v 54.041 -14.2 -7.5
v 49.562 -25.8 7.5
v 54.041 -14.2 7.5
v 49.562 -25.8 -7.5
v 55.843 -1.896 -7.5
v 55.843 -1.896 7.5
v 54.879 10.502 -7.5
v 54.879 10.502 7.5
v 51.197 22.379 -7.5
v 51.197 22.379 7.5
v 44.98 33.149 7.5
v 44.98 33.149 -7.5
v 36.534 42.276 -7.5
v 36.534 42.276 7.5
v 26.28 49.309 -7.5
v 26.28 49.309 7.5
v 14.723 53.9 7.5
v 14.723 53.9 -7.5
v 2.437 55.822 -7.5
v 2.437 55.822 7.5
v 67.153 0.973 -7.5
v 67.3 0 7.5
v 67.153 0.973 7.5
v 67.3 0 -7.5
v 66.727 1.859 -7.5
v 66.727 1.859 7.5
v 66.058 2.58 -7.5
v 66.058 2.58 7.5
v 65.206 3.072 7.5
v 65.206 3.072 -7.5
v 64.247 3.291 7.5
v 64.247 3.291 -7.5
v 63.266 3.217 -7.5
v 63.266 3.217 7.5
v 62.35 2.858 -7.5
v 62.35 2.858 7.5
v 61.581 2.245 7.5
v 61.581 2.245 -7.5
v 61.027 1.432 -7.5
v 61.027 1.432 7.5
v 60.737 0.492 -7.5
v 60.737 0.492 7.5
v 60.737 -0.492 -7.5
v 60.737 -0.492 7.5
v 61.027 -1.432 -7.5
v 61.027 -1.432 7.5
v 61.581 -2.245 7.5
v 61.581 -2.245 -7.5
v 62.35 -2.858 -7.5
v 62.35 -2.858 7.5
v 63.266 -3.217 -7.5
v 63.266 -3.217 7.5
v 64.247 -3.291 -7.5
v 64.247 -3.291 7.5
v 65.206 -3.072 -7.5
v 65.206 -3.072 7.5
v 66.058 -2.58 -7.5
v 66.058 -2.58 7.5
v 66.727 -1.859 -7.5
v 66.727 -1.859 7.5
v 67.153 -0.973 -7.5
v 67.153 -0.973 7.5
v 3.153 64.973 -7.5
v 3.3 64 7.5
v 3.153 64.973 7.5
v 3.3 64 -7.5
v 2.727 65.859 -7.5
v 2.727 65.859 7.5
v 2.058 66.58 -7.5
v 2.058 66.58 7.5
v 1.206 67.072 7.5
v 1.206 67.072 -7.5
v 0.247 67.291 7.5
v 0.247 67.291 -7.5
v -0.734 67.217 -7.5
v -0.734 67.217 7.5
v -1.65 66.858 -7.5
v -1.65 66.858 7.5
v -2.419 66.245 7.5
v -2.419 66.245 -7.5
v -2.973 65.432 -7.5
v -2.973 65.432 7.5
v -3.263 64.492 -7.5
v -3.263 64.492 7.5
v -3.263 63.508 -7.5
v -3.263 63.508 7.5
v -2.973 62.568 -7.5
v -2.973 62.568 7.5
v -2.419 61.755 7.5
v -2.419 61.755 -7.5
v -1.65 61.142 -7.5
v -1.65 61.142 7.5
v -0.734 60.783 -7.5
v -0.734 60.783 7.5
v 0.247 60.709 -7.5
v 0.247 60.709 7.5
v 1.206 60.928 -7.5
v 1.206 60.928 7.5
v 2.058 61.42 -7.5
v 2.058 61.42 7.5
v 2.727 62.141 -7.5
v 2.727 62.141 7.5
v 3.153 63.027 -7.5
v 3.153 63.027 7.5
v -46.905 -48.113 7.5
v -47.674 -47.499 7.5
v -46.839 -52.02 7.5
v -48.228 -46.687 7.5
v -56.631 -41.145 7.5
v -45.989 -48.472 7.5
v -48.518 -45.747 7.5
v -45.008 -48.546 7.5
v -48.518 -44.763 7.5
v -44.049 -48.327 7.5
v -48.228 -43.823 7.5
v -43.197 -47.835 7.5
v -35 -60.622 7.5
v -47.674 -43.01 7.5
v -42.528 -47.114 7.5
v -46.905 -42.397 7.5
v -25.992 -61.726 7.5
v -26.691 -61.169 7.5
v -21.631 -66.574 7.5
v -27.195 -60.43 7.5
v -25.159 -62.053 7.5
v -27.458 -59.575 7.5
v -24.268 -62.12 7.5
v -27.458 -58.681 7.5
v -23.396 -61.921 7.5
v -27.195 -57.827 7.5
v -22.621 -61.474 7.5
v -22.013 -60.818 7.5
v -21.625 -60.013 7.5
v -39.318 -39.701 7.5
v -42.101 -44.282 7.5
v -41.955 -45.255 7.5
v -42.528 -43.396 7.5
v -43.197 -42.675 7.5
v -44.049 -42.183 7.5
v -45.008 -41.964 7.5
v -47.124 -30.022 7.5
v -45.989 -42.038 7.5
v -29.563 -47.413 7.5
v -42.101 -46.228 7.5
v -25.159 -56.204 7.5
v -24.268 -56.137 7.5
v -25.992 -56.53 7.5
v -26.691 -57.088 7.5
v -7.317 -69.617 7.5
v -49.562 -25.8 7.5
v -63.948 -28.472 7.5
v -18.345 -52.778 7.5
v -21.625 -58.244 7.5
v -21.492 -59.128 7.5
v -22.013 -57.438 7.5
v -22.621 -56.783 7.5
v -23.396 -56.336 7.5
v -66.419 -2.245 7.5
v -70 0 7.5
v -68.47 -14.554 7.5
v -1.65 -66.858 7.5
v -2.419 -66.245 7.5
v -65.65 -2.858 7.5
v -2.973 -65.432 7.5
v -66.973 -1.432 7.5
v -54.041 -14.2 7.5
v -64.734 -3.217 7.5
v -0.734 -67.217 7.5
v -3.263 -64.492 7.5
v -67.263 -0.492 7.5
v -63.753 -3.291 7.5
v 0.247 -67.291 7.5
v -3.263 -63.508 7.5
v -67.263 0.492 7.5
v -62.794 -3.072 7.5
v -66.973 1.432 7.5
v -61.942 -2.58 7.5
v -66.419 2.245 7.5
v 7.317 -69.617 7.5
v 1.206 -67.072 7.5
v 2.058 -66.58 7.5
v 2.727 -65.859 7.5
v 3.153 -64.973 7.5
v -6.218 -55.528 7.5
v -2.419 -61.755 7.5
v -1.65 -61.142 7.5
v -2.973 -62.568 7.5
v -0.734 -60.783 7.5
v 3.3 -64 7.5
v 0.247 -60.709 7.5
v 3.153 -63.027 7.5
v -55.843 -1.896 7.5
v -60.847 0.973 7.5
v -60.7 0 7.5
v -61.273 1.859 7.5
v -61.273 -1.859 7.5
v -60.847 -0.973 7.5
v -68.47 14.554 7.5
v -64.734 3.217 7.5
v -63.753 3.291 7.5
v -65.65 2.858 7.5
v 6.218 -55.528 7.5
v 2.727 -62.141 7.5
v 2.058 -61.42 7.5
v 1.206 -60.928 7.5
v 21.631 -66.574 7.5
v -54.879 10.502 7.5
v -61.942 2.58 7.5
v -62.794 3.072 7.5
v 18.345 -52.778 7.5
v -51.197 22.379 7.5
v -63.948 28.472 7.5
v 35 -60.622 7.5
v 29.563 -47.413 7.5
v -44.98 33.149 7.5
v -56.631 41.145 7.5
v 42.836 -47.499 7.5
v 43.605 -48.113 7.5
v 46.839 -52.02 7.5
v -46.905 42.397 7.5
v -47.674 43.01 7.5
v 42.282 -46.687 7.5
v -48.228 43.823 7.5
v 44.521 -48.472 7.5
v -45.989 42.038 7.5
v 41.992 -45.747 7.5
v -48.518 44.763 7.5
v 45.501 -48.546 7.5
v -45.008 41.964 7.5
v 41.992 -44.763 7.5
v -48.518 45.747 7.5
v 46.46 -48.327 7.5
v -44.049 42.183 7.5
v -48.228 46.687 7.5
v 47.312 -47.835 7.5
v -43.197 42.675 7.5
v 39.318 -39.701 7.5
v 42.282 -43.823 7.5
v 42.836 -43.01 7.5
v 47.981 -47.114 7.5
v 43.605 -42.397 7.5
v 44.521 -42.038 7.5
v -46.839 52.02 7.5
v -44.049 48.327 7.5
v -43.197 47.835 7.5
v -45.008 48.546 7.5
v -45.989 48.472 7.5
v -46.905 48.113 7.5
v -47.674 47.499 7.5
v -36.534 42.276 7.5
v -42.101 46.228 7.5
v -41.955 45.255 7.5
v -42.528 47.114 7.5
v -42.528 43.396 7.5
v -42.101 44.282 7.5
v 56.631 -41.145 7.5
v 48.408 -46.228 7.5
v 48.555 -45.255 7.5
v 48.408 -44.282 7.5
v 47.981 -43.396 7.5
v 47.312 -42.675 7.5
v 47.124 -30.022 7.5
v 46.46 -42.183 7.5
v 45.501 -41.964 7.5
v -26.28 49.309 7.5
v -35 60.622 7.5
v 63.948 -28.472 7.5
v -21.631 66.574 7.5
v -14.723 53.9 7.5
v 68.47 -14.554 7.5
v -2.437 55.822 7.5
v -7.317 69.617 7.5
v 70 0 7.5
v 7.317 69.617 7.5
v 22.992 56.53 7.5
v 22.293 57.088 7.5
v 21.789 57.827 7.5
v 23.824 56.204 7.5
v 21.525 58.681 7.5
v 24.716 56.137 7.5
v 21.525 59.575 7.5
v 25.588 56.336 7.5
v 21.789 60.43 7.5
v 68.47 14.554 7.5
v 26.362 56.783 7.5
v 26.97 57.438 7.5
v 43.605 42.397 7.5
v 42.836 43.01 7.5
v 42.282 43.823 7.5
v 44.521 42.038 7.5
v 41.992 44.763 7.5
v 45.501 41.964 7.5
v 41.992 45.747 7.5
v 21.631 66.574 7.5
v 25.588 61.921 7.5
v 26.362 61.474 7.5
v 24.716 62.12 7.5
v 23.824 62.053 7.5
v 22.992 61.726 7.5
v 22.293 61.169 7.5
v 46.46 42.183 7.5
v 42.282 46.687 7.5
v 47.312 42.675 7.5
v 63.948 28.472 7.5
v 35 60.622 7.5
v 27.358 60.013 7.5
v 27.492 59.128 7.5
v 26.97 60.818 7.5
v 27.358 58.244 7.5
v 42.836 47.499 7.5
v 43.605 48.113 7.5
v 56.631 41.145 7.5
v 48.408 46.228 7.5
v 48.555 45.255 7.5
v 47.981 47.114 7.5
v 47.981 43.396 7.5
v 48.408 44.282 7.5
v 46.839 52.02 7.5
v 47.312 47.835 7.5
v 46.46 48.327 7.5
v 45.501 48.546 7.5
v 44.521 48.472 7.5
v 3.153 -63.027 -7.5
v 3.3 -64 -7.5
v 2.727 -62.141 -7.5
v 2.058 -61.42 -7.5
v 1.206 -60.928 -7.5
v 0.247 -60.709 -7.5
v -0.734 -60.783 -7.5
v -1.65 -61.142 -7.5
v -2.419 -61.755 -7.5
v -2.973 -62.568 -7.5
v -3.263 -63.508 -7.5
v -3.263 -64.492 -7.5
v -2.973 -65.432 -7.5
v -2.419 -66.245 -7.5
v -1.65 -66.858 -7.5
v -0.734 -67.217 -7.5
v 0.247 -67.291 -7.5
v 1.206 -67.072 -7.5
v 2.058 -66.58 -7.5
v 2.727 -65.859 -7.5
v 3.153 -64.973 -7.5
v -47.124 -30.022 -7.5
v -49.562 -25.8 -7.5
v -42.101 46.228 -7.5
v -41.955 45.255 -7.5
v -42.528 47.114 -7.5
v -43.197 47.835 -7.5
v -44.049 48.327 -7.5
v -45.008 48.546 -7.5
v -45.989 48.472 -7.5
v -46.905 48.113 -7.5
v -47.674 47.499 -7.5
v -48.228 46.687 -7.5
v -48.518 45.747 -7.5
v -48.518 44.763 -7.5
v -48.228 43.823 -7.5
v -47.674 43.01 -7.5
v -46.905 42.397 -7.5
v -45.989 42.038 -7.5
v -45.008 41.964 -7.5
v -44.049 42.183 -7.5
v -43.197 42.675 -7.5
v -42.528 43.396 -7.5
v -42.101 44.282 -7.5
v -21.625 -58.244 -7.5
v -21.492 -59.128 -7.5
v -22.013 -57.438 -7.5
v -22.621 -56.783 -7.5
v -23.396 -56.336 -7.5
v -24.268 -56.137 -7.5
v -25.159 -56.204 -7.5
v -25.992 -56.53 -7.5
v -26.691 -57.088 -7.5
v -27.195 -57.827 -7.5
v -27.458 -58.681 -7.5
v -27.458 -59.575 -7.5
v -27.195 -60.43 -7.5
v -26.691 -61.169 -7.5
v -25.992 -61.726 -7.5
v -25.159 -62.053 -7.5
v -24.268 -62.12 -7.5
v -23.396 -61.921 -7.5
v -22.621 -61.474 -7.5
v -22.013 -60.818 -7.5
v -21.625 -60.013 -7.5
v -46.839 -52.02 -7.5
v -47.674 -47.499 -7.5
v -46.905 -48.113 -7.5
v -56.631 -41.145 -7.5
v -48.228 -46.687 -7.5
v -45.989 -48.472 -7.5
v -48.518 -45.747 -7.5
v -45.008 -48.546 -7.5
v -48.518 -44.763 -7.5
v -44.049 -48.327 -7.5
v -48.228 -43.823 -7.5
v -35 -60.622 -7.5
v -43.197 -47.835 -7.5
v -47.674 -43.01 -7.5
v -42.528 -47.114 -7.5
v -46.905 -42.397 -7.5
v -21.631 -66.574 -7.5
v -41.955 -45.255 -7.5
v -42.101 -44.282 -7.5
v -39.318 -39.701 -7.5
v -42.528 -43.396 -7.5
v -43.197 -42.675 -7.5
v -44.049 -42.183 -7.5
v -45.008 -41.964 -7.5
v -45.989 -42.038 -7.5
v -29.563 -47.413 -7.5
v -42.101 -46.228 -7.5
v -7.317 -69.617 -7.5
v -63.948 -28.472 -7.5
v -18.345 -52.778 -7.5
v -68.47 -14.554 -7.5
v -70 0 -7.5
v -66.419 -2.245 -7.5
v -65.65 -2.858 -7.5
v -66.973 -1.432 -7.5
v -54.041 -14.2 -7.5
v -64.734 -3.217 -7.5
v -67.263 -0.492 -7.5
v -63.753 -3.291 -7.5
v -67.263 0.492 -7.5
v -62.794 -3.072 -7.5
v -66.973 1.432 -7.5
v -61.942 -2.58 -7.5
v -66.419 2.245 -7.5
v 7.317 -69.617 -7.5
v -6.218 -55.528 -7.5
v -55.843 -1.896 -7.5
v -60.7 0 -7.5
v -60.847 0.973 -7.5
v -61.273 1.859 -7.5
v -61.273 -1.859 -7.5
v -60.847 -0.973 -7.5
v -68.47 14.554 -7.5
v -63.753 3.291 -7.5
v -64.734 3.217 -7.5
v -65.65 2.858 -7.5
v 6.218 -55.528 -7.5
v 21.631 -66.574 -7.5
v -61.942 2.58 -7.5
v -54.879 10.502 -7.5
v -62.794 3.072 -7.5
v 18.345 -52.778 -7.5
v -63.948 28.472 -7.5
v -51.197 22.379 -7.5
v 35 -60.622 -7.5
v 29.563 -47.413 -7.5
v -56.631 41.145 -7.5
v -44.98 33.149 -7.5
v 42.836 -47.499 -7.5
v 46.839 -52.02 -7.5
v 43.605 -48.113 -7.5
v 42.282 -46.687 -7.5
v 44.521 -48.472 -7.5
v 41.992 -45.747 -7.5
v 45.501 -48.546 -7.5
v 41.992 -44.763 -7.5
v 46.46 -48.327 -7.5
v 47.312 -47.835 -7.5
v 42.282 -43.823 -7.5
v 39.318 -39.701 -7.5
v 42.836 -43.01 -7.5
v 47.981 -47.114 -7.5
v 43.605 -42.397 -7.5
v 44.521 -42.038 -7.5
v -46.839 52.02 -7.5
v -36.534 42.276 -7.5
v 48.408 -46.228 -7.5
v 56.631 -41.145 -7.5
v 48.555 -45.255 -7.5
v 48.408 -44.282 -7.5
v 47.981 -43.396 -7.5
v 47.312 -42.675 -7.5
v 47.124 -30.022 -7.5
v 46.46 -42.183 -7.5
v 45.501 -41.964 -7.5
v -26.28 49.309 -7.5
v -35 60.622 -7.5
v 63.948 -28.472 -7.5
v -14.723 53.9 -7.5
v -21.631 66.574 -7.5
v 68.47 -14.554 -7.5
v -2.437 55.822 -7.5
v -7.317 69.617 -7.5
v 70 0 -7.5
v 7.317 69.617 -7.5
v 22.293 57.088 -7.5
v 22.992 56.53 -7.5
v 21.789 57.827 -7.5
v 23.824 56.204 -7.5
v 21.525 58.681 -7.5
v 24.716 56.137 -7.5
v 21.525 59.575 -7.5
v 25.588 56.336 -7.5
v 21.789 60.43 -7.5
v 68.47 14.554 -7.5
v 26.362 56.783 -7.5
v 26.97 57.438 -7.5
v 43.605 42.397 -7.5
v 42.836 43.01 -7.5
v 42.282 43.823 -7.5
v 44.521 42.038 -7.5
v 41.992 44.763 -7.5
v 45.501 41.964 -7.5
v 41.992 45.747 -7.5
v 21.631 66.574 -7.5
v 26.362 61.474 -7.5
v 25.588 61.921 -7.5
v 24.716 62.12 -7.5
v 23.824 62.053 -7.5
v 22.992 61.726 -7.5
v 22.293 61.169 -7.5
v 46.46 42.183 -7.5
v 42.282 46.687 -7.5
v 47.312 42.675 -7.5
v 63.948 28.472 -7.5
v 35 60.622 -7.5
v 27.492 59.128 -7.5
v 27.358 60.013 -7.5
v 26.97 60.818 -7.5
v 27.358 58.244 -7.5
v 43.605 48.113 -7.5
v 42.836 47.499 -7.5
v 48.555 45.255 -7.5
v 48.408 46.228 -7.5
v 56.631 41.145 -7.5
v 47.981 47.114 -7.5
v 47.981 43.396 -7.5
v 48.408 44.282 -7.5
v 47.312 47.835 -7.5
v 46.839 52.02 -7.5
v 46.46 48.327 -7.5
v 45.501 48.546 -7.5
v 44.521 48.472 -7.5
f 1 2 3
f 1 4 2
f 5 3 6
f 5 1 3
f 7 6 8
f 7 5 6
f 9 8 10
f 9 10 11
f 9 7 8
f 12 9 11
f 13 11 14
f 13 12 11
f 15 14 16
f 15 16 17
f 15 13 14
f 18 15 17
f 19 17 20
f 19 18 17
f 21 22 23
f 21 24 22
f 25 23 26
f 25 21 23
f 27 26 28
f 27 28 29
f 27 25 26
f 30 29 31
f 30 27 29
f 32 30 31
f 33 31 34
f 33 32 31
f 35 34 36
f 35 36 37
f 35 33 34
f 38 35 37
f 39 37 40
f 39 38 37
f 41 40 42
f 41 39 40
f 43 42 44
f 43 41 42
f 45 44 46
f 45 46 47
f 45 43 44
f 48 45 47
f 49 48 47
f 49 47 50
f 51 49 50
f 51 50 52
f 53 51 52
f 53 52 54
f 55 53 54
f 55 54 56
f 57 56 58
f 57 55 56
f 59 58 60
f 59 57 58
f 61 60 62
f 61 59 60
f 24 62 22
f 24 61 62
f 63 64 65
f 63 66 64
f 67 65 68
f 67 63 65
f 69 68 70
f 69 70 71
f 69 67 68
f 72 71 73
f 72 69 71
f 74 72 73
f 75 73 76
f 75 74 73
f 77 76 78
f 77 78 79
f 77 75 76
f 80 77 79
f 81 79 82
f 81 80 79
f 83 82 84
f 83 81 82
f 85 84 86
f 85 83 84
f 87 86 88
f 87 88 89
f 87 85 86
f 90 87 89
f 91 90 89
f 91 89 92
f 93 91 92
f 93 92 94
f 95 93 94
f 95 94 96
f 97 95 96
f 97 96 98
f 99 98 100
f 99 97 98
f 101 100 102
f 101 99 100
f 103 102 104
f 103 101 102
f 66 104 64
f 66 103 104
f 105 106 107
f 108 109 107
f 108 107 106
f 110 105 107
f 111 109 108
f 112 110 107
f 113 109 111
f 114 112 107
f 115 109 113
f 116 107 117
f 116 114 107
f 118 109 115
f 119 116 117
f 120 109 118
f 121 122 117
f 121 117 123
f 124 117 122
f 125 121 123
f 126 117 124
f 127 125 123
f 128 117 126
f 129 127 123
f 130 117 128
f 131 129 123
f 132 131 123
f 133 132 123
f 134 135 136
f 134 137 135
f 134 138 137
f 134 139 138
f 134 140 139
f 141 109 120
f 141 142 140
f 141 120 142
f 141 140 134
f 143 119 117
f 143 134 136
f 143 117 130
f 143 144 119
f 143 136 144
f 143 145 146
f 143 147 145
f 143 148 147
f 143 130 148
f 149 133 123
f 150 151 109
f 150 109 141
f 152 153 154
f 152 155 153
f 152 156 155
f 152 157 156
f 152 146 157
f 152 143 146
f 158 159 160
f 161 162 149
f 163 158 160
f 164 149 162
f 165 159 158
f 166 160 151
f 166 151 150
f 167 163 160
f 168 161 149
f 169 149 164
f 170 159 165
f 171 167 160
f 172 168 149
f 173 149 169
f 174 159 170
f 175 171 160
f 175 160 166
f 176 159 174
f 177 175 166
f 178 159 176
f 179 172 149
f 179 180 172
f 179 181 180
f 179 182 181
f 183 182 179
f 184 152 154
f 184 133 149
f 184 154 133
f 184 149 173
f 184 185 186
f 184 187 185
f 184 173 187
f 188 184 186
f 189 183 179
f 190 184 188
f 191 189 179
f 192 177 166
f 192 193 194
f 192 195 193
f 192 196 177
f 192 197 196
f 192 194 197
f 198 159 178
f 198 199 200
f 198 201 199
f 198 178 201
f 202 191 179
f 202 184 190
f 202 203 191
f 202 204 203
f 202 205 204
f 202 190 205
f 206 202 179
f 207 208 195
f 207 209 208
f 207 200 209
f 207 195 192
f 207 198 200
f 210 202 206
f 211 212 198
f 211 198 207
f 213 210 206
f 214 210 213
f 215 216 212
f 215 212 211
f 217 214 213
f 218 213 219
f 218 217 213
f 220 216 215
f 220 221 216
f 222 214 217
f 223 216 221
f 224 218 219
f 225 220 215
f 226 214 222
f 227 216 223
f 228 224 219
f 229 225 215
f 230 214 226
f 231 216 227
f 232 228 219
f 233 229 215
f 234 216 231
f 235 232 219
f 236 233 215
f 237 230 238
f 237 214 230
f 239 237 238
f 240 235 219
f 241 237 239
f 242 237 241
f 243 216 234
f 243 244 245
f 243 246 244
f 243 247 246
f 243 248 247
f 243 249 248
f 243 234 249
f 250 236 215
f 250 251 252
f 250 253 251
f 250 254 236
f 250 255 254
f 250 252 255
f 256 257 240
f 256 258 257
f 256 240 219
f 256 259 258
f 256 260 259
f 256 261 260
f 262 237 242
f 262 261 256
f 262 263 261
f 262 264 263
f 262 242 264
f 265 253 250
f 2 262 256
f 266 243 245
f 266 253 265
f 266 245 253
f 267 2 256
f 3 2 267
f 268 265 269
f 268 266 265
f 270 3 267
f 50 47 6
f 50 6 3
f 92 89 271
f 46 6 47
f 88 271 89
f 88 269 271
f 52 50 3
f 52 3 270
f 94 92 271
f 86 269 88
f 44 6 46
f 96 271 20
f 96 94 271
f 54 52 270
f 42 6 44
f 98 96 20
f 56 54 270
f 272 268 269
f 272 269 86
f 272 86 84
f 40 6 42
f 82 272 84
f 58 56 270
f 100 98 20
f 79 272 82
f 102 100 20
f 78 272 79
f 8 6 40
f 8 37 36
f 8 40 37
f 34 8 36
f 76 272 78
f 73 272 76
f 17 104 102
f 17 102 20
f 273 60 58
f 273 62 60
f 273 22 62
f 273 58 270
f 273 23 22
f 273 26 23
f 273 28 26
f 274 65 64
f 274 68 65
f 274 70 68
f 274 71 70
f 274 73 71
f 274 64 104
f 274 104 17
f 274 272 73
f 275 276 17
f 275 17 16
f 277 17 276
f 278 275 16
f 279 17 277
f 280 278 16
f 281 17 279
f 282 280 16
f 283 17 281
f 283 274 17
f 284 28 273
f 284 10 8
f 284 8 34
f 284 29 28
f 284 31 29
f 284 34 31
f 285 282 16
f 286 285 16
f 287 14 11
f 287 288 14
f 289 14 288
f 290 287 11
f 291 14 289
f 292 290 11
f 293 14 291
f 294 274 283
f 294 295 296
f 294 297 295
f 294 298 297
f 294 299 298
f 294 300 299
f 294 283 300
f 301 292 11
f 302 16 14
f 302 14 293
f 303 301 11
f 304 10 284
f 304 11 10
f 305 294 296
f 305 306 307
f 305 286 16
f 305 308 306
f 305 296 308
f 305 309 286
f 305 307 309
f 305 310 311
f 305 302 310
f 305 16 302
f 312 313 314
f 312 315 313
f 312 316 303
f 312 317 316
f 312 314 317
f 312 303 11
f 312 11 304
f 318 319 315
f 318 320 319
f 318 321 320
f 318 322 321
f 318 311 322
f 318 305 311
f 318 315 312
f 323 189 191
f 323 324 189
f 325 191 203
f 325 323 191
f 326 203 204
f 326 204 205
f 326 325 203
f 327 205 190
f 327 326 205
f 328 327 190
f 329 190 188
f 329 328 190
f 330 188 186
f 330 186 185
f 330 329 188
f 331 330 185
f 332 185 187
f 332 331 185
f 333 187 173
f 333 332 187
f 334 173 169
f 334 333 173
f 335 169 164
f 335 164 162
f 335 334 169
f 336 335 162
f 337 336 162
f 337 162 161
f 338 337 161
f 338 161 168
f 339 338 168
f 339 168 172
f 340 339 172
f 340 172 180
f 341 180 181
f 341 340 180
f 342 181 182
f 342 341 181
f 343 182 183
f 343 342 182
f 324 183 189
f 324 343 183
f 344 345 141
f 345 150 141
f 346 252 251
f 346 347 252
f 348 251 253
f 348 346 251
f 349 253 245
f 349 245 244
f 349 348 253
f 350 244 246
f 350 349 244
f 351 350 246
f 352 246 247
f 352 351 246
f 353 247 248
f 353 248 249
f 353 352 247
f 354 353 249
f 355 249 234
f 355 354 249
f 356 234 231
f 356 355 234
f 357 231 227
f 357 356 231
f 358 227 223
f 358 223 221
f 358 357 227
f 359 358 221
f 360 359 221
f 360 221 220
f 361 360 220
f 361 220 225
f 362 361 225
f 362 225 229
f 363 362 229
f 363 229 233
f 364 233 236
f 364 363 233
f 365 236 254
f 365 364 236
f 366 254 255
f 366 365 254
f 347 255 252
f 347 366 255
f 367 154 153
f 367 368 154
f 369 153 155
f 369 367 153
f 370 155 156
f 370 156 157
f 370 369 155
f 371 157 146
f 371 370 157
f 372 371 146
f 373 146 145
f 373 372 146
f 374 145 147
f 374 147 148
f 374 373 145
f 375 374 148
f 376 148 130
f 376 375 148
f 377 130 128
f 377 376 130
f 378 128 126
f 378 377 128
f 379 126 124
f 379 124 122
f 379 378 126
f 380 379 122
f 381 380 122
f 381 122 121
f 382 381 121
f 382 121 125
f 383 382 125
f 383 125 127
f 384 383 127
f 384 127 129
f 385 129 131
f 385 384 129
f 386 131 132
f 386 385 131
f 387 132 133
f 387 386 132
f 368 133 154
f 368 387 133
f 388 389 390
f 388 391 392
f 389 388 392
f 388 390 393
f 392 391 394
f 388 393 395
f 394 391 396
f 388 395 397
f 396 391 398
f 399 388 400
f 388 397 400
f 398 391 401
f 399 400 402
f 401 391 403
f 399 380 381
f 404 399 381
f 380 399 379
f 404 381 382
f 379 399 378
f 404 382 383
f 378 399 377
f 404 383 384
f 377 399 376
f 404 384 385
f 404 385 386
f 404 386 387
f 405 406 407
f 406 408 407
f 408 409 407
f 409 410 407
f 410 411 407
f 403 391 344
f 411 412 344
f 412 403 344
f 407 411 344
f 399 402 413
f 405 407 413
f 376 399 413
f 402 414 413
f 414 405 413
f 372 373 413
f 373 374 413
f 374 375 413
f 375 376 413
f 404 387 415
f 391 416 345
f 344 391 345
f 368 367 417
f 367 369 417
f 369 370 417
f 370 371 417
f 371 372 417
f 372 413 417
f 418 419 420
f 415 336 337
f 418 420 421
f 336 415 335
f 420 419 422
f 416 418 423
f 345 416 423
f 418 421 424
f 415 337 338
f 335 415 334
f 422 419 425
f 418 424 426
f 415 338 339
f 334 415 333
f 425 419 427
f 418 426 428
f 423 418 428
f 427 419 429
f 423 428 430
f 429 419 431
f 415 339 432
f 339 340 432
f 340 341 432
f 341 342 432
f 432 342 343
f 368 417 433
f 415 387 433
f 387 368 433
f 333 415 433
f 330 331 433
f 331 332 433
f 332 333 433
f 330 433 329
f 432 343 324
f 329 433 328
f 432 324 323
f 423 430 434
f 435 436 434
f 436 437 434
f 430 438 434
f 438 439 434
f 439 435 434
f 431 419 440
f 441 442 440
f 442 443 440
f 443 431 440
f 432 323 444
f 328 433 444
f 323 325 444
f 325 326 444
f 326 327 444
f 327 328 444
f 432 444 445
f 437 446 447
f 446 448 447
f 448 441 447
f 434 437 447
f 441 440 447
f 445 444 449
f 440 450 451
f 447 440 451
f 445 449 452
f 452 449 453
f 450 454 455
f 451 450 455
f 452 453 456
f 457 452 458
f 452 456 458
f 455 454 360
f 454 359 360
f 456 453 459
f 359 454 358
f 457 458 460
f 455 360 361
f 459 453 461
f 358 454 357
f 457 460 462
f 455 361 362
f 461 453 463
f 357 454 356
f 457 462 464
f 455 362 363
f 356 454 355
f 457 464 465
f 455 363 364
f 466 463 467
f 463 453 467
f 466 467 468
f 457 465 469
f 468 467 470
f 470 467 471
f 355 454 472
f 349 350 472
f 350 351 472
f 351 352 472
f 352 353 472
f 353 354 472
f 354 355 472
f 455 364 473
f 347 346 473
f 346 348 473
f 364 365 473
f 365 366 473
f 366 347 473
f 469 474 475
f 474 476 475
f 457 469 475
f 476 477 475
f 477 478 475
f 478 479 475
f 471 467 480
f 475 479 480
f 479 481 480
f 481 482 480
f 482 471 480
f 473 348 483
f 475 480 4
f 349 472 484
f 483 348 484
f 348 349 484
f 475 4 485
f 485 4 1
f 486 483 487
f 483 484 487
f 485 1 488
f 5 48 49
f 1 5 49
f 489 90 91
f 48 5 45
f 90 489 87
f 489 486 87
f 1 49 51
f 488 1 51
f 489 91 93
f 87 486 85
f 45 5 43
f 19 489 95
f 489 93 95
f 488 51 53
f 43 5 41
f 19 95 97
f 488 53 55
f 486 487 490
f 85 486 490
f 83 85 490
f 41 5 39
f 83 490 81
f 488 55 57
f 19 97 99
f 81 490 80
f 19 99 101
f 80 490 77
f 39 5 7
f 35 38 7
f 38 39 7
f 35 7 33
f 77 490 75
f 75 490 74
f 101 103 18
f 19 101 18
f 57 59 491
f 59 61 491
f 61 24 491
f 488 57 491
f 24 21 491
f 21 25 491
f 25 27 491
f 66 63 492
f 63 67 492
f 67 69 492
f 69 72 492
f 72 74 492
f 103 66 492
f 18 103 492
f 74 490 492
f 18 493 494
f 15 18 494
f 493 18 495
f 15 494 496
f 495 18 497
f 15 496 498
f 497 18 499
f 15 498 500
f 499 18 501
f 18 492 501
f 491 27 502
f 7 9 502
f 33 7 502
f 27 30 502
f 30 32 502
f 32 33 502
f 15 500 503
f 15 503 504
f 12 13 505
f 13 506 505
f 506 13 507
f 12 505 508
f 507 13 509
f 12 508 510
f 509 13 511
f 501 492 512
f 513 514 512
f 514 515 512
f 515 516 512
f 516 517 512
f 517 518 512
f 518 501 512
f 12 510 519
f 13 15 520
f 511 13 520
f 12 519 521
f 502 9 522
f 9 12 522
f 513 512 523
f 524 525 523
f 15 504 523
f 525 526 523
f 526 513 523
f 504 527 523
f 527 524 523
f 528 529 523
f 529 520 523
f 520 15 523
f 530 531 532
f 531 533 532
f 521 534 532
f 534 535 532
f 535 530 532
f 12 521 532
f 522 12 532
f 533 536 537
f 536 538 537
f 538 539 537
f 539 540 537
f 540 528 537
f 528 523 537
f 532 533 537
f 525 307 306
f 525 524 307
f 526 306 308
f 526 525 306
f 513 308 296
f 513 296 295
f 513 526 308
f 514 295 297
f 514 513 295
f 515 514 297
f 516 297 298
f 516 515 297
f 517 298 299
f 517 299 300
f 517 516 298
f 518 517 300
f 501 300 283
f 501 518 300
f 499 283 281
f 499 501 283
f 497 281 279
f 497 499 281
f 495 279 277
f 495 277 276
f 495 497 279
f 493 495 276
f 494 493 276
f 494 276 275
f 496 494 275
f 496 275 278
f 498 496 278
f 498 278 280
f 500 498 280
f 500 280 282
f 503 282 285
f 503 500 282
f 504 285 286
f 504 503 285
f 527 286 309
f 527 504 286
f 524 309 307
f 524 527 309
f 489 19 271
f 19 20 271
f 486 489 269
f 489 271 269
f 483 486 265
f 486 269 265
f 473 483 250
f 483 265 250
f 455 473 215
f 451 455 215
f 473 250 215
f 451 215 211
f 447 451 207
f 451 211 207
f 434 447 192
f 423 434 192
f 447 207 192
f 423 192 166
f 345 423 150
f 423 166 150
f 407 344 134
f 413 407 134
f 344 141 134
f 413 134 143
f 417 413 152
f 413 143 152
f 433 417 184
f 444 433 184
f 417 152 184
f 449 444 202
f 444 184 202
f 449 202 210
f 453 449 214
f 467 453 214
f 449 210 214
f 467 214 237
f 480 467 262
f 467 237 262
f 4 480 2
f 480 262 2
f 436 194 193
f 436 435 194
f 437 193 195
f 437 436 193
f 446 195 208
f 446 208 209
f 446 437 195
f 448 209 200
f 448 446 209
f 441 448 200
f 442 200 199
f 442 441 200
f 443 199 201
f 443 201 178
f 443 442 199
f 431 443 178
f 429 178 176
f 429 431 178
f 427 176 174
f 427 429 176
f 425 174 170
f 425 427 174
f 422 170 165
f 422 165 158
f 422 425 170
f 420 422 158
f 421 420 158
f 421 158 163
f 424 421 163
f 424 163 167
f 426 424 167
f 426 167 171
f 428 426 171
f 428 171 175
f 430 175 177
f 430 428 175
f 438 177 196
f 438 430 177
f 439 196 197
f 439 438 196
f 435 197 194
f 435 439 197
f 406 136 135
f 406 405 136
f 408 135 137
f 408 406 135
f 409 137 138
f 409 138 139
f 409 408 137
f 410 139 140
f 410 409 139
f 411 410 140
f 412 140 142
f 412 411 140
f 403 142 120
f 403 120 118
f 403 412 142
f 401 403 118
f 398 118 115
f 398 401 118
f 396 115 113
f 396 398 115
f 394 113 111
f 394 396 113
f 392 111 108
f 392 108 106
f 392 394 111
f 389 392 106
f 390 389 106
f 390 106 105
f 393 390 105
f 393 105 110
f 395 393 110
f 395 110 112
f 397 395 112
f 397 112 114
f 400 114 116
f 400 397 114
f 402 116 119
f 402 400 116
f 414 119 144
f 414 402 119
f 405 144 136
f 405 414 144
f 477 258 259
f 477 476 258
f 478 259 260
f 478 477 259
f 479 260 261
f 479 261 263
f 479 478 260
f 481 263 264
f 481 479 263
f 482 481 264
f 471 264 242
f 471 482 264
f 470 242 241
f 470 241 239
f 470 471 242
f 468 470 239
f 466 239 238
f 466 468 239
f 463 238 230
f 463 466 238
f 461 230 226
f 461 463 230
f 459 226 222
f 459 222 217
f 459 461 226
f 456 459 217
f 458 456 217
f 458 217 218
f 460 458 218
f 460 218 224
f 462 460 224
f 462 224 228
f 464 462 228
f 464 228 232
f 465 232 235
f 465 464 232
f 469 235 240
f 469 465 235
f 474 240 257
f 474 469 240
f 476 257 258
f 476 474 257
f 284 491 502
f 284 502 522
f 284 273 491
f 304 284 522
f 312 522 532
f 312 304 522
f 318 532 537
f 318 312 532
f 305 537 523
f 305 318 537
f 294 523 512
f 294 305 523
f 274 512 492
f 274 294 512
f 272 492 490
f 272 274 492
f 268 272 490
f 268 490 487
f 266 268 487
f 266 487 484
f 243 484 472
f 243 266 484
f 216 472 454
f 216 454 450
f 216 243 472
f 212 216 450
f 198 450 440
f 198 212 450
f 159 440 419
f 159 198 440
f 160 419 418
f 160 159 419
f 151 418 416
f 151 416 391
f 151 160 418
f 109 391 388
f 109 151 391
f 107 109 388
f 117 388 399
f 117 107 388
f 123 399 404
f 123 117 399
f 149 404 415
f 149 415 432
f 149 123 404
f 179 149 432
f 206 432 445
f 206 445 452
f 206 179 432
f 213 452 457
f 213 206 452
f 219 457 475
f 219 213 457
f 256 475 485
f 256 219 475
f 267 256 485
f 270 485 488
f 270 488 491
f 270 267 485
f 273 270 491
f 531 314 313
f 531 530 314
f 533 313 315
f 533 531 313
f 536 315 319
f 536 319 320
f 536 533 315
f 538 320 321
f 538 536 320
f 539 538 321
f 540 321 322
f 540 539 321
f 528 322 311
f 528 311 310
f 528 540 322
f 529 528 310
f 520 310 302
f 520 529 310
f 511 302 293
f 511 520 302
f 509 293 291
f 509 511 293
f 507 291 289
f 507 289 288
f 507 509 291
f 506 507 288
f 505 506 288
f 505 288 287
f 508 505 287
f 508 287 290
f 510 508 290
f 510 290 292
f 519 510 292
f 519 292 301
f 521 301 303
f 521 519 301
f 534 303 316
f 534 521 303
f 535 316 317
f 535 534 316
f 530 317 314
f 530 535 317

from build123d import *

# Parameters (mm, degrees)
SKETCH1_R           = 70
SKETCH1_R_2         = 3.3
SKETCH1_R_3         = 3
BOSS_EXTRUDE1_DEPTH = 7.5


with BuildPart() as part:
    # Sketch1 → Boss-Extrude1 (new, symmetric)
    with BuildSketch(Plane.XY):
        Circle(SKETCH1_R)
        with Locations((64, 0)):
            Circle(SKETCH1_R_2, mode=Mode.SUBTRACT)
        with Locations((45.254833996, 45.254833996)):
            Circle(SKETCH1_R_2, mode=Mode.SUBTRACT)
        with Locations((0, 64)):
            Circle(SKETCH1_R_2, mode=Mode.SUBTRACT)
        with Locations((-45.254833996, 45.254833996)):
            Circle(SKETCH1_R_2, mode=Mode.SUBTRACT)
        with Locations((-64, 0)):
            Circle(SKETCH1_R_2, mode=Mode.SUBTRACT)
        with Locations((-45.254833996, -45.254833996)):
            Circle(SKETCH1_R_2, mode=Mode.SUBTRACT)
        with Locations((0, -64)):
            Circle(SKETCH1_R_2, mode=Mode.SUBTRACT)
        with Locations((45.254833996, -45.254833996)):
            Circle(SKETCH1_R_2, mode=Mode.SUBTRACT)
        with Locations((24.491739671, 59.128290081)):
            Circle(SKETCH1_R_3, mode=Mode.SUBTRACT)
        with Locations((-24.491739671, -59.128290081)):
            Circle(SKETCH1_R_3, mode=Mode.SUBTRACT)
        with BuildLine():
            Line((2.437233269, 55.821819381), (-2.437233269, 55.821819381))
            ThreePointArc((-2.437233269, 55.821819381), (-48.389169436, 27.9375), (-49.561730304, -25.800203765))
            Line((-49.561730304, -25.800203765), (-47.124497035, -30.021615616))
            ThreePointArc((-47.124497035, -30.021615616), (0, -55.875), (47.124497035, -30.021615616))
            Line((47.124497035, -30.021615616), (49.561730304, -25.800203765))
            ThreePointArc((49.561730304, -25.800203765), (48.389169436, 27.9375), (2.437233269, 55.821819381))
        make_face(mode=Mode.SUBTRACT)
    extrude(amount=BOSS_EXTRUDE1_DEPTH, both=True)


solid = part.part
